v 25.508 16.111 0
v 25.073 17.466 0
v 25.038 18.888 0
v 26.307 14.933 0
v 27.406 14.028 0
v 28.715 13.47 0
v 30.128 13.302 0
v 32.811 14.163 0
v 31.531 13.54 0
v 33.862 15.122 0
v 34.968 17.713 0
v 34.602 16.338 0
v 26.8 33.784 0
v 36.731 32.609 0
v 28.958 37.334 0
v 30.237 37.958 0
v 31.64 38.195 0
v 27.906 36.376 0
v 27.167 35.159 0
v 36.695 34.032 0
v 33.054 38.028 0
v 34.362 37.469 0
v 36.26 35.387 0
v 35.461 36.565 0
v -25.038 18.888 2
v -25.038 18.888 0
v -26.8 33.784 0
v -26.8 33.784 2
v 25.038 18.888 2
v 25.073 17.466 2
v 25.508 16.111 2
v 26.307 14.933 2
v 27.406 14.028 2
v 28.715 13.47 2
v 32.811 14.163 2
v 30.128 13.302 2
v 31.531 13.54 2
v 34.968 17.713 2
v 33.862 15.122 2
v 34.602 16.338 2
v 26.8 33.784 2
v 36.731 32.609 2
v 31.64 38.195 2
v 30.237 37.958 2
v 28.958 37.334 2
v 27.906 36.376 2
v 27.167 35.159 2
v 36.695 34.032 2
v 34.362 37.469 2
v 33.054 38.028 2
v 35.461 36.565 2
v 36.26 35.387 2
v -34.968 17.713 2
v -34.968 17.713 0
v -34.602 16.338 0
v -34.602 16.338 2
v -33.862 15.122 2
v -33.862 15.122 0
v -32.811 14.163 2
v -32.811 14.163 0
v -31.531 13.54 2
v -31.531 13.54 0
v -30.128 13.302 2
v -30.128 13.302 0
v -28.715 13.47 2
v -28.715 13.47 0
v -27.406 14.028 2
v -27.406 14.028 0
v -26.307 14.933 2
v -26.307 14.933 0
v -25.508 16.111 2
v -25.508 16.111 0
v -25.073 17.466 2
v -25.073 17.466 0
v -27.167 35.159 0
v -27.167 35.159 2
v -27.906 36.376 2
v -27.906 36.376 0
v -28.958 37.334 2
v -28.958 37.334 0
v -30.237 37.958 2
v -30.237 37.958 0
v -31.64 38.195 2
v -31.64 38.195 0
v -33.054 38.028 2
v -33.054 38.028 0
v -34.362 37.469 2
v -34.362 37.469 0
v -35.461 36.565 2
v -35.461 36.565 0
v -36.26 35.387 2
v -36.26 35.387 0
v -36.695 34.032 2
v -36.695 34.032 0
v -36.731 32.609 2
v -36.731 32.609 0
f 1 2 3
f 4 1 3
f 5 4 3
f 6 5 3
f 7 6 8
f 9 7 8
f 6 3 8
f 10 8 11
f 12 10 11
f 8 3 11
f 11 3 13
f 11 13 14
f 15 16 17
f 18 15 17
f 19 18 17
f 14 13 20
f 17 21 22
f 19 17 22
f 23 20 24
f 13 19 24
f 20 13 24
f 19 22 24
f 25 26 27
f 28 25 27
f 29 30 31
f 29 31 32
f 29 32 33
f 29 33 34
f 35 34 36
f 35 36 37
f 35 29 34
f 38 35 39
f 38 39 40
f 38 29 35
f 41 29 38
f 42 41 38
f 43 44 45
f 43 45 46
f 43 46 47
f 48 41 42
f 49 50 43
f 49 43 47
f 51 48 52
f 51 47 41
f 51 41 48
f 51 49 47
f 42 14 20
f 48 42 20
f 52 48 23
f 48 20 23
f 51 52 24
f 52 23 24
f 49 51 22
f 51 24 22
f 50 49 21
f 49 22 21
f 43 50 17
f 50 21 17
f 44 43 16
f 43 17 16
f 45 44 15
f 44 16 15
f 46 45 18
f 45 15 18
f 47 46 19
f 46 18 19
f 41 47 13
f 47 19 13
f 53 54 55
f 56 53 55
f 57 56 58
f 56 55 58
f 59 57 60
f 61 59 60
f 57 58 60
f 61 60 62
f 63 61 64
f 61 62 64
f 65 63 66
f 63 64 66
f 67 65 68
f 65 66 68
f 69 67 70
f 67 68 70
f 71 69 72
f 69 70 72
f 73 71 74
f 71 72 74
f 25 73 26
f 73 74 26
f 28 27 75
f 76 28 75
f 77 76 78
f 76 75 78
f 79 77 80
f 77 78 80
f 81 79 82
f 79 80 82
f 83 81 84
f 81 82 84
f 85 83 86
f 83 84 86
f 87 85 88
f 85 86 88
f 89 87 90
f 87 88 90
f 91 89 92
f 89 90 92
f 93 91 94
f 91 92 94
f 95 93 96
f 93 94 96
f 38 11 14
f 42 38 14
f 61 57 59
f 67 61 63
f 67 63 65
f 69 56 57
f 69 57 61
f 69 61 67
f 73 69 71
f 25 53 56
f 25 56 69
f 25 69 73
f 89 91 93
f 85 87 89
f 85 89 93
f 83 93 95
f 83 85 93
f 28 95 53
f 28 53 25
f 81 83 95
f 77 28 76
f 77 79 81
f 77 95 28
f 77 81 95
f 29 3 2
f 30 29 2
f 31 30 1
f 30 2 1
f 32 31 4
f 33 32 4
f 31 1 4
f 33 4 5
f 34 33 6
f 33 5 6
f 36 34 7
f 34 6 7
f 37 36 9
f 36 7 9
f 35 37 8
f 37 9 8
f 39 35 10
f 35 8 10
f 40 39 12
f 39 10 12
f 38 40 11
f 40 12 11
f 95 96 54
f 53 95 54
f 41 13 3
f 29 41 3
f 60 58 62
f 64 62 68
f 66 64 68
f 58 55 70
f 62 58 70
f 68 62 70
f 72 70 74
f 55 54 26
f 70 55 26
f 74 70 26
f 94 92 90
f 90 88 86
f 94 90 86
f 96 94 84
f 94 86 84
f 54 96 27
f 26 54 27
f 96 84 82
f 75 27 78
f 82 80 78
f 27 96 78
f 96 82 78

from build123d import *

# Parameters (mm, degrees)
F1_DEPTH = 2


# Not quite as in the source:
# - the program builds the solid bodies; features that only make, move or delete a surface that nothing else refers to are left out


with BuildPart() as f1:
    # F0 (on Top) → F1 (new body)
    with BuildSketch(Plane.XY):
        with BuildLine():
            Line((-36.7307308238, 32.6093674274), (-26.8, 33.7843505361))
            ThreePointArc((-26.8, 33.7843505361), (-32.3528569662, 38.1622243937), (-36.7307308238, 32.6093674274))
        make_face()
        Polygon((-25.037525337, 18.8882543005), (-26.8, 33.7843505361), (-36.7307308238, 32.6093674274), (-34.9682561607, 17.7132711918), align=None)
        with BuildLine():
            ThreePointArc((-34.9682561607, 17.7132711918), (-29.4153991945, 13.3353973342), (-25.037525337, 18.8882543005))
            Line((-25.037525337, 18.8882543005), (-34.9682561607, 17.7132711918))
        make_face()
    extrude(amount=F1_DEPTH)


with BuildPart() as f1b:
    # F0 (on Top) → F1, piece 2 (new body)
    with BuildSketch(Plane.XY):
        with BuildLine():
            Line((34.9682561607, 17.7132711918), (25.037525337, 18.8882543005))
            ThreePointArc((25.037525337, 18.8882543005), (29.4153991945, 13.3353973342), (34.9682561607, 17.7132711918))
        make_face()
        Polygon((36.7307308238, 32.6093674274), (26.8, 33.7843505361), (25.037525337, 18.8882543005), (34.9682561607, 17.7132711918), align=None)
        with BuildLine():
            ThreePointArc((36.7307308238, 32.6093674274), (32.3528569662, 38.1622243937), (26.8, 33.7843505361))
            Line((26.8, 33.7843505361), (36.7307308238, 32.6093674274))
        make_face()
    extrude(amount=F1_DEPTH)


solid = Compound([f1.part, f1b.part])
